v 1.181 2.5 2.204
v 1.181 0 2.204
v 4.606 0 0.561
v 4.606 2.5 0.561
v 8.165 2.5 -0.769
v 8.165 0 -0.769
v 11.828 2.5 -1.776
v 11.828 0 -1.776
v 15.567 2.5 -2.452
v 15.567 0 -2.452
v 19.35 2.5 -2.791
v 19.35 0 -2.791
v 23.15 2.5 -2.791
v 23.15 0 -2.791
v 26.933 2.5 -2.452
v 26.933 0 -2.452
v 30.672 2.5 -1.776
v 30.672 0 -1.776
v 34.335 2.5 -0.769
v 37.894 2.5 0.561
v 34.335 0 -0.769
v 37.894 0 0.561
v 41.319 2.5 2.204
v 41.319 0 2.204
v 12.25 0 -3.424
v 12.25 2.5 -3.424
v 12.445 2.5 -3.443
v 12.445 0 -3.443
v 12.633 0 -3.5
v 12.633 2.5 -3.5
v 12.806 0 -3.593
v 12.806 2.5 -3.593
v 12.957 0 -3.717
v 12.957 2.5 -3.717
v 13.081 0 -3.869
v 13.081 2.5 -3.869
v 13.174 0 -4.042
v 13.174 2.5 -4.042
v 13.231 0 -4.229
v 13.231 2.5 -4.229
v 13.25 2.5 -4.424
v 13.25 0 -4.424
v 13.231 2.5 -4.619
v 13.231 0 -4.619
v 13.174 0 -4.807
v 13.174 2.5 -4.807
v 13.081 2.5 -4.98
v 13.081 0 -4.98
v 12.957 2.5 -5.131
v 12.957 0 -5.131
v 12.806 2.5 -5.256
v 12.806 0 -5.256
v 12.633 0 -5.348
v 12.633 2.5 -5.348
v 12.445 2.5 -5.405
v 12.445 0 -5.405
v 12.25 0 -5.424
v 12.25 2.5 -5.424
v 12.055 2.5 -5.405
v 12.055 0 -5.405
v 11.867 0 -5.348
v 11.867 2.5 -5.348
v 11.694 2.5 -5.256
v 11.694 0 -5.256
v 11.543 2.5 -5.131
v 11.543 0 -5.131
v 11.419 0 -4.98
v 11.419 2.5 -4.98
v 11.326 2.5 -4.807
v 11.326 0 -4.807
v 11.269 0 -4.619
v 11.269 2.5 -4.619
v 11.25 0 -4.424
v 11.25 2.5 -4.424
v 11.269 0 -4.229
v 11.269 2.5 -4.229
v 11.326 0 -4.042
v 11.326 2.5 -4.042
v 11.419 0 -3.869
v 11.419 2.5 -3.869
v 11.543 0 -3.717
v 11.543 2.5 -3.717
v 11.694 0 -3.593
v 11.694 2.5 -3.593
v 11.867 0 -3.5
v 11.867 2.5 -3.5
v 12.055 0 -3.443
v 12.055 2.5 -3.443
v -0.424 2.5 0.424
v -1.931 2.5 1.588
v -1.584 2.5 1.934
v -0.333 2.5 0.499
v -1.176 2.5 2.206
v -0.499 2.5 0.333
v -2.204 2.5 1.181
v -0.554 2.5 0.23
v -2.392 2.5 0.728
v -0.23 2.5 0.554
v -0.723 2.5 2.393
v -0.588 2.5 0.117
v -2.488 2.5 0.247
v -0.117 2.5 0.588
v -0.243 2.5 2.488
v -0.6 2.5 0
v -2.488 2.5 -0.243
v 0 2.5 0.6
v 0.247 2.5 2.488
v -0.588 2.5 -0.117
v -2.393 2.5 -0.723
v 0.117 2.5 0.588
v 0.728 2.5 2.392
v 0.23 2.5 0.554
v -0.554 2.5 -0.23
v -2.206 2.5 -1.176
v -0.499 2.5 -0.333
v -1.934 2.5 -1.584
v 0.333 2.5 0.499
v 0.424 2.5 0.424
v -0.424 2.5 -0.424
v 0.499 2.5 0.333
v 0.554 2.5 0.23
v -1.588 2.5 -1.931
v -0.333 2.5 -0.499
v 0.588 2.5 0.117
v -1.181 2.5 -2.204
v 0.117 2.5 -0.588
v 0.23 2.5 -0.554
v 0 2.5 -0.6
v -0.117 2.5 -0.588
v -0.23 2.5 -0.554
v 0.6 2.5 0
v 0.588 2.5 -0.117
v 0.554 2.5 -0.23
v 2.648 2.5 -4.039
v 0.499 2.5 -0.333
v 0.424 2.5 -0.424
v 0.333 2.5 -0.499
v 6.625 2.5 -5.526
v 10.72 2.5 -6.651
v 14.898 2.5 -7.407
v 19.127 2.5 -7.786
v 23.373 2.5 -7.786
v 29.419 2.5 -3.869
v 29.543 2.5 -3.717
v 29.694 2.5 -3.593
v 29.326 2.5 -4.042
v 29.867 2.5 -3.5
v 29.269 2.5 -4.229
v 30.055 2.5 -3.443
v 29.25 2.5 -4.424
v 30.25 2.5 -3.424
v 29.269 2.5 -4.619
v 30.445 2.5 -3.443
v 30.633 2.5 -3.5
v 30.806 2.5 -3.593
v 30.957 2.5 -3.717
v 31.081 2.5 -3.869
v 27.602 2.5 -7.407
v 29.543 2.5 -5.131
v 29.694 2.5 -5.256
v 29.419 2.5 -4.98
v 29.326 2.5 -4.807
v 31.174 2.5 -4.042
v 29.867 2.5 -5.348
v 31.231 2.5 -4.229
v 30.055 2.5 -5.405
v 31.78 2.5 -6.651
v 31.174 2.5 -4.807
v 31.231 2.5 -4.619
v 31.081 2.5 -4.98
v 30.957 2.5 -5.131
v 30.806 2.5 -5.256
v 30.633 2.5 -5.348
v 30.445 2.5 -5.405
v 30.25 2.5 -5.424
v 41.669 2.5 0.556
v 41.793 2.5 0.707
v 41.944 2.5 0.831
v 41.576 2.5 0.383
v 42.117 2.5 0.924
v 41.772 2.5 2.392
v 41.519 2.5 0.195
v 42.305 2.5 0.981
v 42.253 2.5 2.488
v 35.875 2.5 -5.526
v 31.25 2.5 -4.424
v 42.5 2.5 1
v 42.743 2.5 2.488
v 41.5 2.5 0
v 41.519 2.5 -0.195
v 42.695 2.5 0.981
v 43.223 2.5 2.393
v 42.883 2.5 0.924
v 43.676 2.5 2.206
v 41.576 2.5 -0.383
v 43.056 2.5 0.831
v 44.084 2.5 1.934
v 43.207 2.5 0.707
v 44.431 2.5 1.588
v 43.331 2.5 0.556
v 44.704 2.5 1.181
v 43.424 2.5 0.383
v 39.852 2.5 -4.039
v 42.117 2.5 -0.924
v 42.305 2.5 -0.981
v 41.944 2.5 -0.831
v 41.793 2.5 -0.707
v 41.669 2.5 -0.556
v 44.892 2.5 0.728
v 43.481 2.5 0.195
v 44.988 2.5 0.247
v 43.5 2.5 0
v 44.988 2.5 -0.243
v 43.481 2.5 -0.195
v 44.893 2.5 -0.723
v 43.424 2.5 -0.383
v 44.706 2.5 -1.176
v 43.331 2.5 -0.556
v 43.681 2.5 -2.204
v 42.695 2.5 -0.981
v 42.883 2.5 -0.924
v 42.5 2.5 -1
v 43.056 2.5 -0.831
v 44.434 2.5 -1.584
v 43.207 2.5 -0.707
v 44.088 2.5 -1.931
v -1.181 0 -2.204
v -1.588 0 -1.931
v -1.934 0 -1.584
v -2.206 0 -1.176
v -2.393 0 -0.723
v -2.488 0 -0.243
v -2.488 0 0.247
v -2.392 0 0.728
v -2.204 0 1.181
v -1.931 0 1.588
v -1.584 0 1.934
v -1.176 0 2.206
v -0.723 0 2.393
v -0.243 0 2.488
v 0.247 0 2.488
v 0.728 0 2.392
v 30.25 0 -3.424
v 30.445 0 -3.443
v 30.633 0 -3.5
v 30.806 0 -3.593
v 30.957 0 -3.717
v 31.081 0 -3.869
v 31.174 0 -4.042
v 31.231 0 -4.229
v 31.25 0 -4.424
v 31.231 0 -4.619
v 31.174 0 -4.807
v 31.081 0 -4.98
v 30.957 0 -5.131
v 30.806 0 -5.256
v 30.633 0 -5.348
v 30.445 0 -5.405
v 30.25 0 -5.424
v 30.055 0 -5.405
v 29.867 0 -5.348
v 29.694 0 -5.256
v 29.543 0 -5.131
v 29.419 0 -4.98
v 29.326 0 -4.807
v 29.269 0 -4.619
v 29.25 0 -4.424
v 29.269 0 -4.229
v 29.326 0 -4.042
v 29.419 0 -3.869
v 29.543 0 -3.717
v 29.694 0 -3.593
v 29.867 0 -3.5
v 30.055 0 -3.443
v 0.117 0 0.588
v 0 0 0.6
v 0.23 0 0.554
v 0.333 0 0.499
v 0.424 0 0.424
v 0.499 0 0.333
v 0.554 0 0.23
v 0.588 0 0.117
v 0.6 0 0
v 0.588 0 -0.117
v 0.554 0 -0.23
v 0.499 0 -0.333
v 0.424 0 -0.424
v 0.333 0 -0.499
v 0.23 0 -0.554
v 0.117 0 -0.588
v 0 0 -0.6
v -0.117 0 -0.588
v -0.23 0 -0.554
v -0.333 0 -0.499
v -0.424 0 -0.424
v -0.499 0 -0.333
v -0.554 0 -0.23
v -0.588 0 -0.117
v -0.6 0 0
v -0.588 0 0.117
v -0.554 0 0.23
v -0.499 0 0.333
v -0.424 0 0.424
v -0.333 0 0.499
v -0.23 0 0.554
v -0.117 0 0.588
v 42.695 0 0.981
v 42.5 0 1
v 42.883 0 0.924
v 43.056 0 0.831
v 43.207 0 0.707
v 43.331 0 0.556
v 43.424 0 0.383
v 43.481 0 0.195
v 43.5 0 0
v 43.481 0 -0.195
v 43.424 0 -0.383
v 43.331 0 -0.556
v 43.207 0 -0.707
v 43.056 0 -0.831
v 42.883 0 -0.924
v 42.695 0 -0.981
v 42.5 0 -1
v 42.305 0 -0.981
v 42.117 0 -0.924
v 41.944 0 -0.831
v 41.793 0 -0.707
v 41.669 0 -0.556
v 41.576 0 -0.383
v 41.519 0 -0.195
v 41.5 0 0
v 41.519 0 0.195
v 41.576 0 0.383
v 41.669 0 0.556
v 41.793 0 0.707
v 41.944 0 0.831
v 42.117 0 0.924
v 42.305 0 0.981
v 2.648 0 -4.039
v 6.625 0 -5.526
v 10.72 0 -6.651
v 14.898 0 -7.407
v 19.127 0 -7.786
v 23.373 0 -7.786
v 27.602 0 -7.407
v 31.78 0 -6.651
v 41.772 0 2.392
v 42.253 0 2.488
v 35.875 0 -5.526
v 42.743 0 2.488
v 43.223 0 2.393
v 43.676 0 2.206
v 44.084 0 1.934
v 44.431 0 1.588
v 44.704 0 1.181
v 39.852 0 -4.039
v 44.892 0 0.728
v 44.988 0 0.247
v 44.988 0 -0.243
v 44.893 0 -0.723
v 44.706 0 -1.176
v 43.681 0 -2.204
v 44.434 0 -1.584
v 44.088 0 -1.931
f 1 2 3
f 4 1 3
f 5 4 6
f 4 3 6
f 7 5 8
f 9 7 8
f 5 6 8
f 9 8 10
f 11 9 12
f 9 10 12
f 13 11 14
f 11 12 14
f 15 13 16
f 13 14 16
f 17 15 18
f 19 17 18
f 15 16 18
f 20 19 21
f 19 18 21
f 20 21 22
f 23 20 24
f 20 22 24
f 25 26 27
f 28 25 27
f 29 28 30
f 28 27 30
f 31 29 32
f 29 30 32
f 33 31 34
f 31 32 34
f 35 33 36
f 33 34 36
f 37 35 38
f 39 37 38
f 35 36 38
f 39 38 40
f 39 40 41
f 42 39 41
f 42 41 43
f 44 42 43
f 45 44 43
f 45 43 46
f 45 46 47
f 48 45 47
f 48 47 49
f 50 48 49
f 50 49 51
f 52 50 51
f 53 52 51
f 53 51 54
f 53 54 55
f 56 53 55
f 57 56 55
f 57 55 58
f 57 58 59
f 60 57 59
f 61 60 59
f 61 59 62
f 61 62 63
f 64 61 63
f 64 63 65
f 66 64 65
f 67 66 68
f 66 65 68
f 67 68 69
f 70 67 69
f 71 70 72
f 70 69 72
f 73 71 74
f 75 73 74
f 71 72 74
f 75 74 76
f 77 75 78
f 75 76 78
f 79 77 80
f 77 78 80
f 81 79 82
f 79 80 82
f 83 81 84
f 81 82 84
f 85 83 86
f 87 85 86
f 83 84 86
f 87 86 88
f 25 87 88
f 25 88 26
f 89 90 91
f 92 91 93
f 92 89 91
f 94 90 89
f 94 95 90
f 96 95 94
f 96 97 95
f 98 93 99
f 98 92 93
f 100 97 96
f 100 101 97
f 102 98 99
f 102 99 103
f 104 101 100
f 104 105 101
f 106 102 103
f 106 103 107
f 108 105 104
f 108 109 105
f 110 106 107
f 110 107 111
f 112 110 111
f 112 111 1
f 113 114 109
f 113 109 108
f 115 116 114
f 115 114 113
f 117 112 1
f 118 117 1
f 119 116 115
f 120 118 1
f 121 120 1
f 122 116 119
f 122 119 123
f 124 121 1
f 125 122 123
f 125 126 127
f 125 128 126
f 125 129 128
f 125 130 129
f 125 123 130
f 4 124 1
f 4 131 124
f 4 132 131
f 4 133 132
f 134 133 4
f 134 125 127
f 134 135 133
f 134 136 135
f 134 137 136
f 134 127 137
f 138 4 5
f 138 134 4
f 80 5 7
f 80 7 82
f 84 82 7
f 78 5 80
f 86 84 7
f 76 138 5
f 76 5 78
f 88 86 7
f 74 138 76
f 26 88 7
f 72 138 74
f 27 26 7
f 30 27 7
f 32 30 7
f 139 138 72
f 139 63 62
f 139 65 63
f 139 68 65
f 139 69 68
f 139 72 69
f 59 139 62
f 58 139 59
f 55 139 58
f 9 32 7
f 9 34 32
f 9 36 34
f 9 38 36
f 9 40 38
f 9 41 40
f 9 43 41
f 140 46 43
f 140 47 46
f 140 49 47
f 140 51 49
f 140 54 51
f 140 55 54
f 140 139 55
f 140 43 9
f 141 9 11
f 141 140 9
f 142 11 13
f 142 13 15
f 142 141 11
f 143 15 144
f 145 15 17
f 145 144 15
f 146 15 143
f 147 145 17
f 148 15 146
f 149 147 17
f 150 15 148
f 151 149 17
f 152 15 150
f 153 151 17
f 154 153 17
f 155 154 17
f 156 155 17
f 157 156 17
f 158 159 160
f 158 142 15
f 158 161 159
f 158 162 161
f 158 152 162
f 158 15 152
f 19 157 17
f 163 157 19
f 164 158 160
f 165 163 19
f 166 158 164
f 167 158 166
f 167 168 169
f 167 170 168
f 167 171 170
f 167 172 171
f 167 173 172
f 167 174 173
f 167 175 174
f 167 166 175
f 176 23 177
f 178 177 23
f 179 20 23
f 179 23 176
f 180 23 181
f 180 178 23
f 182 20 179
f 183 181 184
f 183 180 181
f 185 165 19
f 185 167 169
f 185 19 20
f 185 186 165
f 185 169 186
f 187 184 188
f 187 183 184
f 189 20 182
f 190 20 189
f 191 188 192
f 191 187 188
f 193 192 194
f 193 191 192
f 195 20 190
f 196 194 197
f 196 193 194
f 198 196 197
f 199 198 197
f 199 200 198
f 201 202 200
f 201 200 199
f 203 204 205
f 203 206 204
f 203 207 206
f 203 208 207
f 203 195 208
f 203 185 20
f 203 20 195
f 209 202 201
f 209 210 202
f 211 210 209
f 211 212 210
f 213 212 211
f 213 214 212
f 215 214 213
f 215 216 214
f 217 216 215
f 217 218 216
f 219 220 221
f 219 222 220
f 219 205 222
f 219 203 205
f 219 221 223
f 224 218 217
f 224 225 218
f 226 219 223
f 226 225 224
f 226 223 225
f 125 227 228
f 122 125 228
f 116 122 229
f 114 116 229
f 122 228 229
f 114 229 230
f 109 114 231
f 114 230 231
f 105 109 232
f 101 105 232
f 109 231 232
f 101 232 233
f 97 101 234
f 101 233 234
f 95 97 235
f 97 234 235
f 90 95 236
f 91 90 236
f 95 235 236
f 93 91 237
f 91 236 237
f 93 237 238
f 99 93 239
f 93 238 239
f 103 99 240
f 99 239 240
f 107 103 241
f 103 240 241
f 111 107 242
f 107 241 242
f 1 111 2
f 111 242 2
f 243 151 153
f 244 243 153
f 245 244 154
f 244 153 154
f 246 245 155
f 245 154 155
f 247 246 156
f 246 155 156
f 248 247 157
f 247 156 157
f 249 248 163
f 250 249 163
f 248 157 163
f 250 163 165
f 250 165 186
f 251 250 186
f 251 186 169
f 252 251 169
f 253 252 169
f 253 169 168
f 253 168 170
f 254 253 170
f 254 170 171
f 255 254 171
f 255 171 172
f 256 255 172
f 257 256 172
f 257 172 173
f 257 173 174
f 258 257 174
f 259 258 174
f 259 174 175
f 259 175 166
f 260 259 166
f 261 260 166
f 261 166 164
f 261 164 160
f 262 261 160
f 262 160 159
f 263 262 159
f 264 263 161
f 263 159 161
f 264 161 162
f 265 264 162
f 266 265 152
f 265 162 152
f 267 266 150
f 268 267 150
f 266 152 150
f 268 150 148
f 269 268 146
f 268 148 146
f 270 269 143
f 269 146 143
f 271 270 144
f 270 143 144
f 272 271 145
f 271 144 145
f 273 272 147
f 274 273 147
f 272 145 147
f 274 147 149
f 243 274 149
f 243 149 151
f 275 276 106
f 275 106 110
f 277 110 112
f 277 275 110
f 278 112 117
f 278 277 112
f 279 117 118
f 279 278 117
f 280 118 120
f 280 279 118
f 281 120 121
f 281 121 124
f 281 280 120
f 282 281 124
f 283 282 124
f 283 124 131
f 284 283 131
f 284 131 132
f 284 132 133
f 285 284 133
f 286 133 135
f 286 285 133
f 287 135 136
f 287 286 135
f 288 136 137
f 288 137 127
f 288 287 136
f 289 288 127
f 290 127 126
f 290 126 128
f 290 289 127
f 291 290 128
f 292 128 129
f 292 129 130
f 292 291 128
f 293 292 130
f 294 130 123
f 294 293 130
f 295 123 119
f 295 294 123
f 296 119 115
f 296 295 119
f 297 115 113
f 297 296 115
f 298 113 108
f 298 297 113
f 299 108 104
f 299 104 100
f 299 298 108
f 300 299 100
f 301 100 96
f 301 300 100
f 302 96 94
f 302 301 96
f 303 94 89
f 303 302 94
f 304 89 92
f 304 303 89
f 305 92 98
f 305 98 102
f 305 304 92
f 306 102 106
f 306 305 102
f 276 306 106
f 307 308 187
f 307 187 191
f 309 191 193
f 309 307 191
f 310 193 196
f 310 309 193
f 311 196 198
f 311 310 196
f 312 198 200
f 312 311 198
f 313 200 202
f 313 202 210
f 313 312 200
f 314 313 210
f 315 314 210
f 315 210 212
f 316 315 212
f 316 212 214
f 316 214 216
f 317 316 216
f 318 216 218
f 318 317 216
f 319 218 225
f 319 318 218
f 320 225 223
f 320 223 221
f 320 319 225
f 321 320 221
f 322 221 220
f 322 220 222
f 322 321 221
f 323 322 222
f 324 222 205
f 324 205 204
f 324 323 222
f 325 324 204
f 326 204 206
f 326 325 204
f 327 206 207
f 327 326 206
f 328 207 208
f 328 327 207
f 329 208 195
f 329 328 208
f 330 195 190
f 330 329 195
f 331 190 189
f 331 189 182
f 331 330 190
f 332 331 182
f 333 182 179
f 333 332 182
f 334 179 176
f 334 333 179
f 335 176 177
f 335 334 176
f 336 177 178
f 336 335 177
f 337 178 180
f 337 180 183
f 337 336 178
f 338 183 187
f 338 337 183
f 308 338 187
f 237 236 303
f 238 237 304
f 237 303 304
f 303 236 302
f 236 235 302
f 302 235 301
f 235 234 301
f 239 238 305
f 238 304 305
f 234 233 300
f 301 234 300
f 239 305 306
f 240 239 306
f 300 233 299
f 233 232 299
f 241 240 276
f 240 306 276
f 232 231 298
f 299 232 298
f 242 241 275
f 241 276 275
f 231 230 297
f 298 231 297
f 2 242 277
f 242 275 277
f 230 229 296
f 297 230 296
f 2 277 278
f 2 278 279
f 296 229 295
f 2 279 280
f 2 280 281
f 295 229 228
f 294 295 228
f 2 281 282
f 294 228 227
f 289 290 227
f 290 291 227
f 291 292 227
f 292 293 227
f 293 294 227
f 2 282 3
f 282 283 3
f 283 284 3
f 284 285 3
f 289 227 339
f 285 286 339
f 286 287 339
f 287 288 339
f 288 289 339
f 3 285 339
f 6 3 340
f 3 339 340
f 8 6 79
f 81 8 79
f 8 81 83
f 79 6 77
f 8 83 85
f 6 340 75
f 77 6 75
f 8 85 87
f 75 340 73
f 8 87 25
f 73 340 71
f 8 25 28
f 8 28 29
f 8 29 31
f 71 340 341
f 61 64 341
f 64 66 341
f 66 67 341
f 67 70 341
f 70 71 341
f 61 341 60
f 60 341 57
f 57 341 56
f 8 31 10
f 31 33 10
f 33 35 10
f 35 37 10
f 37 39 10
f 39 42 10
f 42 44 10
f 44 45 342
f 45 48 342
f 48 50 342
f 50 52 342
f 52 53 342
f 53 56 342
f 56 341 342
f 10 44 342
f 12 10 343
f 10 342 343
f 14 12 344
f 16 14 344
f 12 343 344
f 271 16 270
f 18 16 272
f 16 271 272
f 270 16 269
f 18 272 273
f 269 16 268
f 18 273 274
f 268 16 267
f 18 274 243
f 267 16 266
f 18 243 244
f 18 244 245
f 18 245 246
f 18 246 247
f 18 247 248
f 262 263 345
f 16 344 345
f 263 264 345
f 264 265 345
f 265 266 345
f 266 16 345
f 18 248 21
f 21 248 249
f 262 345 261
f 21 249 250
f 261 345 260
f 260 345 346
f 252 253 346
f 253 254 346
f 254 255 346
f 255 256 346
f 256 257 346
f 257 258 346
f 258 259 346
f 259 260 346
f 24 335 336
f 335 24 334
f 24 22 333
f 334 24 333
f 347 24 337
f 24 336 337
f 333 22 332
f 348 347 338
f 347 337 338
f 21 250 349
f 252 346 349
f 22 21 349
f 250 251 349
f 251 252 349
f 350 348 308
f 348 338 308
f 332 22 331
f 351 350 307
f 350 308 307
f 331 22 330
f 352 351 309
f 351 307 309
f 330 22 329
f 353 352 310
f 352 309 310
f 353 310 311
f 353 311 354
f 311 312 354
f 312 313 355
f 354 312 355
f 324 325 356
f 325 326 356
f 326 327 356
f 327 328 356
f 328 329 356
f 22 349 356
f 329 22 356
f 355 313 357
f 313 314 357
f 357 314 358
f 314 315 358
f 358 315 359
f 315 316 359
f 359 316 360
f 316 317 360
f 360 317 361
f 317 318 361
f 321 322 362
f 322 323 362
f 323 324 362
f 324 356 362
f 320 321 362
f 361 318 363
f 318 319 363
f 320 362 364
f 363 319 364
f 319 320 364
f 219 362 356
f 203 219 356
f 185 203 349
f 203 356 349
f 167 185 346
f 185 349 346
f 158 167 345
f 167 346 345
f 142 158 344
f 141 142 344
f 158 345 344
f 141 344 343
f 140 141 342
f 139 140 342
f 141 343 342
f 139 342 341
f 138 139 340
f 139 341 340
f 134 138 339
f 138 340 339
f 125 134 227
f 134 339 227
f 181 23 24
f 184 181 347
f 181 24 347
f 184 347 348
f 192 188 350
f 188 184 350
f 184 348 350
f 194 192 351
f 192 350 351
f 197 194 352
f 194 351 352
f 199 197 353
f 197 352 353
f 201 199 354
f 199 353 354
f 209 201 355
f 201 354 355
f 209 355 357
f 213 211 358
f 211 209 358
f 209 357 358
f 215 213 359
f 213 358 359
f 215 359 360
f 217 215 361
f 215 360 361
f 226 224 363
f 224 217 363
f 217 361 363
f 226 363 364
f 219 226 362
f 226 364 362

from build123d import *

# Parameters (mm, degrees)
SKETCH1_R           = 2.5
SKETCH1_R_2         = 0.6
SKETCH1_R_3         = 1
BOSS_EXTRUDE1_DEPTH = 2.5
SKETCH2_R           = 1
CUT_EXTRUDE1_DEPTH  = 46.745081512


with BuildPart() as part:
    # Sketch1 → Boss-Extrude1 (new body)
    # profile 1 of 3: a face of its own
    with BuildSketch(Plane(origin=(0, 0, 0), x_dir=(1, 0, 0), z_dir=(0, 1, 0))):
        Circle(SKETCH1_R)
        with Locations(Location((0, 0, 0), (0, 0, 270))):
            Circle(SKETCH1_R_2, mode=Mode.SUBTRACT)
    # profile 2 of 3: a face of its own
    with BuildSketch(Plane(origin=(0, 0, 0), x_dir=(1, 0, 0), z_dir=(0, 1, 0))):
        with BuildLine():
            ThreePointArc((-1.180555556, 2.203698841), (1.284252917, 2.144922946), (2.5, 0))
            ThreePointArc((2.5, 0), (2.144922946, -1.284252917), (1.180555556, -2.203698841))
            ThreePointArc((1.180555556, -2.203698841), (21.25, 2.833420868), (41.319444444, -2.203698841))
            ThreePointArc((41.319444444, -2.203698841), (40.296301159, 1.180555556), (43.680555556, 2.203698841))
            ThreePointArc((43.680555556, 2.203698841), (21.25, 7.833420868), (-1.180555556, 2.203698841))
        make_face()
    # profile 3 of 3: a face of its own
    with BuildSketch(Plane(origin=(0, 0, 0), x_dir=(1, 0, 0), z_dir=(0, 1, 0))):
        with Locations((42.5, 0)):
            Circle(SKETCH1_R)
        with Locations(Location((42.5, 0, 0), (0, 0, 270))):
            Circle(SKETCH1_R_3, mode=Mode.SUBTRACT)
    extrude(amount=BOSS_EXTRUDE1_DEPTH)

    # Sketch2 → Cut-Extrude1 (cut, through all)
    with BuildSketch(Plane(origin=(0, 2.5, 0), x_dir=(1, 0, 0), z_dir=(0, 1, 0))):
        with Locations(Location((12.25, 4.424236239, 0), (0, 0, 270))):
            Circle(SKETCH2_R)
        with Locations(Location((30.25, 4.424236239, 0), (0, 0, 270))):
            Circle(SKETCH2_R)
    extrude(amount=-CUT_EXTRUDE1_DEPTH, mode=Mode.SUBTRACT)


solid = part.part
